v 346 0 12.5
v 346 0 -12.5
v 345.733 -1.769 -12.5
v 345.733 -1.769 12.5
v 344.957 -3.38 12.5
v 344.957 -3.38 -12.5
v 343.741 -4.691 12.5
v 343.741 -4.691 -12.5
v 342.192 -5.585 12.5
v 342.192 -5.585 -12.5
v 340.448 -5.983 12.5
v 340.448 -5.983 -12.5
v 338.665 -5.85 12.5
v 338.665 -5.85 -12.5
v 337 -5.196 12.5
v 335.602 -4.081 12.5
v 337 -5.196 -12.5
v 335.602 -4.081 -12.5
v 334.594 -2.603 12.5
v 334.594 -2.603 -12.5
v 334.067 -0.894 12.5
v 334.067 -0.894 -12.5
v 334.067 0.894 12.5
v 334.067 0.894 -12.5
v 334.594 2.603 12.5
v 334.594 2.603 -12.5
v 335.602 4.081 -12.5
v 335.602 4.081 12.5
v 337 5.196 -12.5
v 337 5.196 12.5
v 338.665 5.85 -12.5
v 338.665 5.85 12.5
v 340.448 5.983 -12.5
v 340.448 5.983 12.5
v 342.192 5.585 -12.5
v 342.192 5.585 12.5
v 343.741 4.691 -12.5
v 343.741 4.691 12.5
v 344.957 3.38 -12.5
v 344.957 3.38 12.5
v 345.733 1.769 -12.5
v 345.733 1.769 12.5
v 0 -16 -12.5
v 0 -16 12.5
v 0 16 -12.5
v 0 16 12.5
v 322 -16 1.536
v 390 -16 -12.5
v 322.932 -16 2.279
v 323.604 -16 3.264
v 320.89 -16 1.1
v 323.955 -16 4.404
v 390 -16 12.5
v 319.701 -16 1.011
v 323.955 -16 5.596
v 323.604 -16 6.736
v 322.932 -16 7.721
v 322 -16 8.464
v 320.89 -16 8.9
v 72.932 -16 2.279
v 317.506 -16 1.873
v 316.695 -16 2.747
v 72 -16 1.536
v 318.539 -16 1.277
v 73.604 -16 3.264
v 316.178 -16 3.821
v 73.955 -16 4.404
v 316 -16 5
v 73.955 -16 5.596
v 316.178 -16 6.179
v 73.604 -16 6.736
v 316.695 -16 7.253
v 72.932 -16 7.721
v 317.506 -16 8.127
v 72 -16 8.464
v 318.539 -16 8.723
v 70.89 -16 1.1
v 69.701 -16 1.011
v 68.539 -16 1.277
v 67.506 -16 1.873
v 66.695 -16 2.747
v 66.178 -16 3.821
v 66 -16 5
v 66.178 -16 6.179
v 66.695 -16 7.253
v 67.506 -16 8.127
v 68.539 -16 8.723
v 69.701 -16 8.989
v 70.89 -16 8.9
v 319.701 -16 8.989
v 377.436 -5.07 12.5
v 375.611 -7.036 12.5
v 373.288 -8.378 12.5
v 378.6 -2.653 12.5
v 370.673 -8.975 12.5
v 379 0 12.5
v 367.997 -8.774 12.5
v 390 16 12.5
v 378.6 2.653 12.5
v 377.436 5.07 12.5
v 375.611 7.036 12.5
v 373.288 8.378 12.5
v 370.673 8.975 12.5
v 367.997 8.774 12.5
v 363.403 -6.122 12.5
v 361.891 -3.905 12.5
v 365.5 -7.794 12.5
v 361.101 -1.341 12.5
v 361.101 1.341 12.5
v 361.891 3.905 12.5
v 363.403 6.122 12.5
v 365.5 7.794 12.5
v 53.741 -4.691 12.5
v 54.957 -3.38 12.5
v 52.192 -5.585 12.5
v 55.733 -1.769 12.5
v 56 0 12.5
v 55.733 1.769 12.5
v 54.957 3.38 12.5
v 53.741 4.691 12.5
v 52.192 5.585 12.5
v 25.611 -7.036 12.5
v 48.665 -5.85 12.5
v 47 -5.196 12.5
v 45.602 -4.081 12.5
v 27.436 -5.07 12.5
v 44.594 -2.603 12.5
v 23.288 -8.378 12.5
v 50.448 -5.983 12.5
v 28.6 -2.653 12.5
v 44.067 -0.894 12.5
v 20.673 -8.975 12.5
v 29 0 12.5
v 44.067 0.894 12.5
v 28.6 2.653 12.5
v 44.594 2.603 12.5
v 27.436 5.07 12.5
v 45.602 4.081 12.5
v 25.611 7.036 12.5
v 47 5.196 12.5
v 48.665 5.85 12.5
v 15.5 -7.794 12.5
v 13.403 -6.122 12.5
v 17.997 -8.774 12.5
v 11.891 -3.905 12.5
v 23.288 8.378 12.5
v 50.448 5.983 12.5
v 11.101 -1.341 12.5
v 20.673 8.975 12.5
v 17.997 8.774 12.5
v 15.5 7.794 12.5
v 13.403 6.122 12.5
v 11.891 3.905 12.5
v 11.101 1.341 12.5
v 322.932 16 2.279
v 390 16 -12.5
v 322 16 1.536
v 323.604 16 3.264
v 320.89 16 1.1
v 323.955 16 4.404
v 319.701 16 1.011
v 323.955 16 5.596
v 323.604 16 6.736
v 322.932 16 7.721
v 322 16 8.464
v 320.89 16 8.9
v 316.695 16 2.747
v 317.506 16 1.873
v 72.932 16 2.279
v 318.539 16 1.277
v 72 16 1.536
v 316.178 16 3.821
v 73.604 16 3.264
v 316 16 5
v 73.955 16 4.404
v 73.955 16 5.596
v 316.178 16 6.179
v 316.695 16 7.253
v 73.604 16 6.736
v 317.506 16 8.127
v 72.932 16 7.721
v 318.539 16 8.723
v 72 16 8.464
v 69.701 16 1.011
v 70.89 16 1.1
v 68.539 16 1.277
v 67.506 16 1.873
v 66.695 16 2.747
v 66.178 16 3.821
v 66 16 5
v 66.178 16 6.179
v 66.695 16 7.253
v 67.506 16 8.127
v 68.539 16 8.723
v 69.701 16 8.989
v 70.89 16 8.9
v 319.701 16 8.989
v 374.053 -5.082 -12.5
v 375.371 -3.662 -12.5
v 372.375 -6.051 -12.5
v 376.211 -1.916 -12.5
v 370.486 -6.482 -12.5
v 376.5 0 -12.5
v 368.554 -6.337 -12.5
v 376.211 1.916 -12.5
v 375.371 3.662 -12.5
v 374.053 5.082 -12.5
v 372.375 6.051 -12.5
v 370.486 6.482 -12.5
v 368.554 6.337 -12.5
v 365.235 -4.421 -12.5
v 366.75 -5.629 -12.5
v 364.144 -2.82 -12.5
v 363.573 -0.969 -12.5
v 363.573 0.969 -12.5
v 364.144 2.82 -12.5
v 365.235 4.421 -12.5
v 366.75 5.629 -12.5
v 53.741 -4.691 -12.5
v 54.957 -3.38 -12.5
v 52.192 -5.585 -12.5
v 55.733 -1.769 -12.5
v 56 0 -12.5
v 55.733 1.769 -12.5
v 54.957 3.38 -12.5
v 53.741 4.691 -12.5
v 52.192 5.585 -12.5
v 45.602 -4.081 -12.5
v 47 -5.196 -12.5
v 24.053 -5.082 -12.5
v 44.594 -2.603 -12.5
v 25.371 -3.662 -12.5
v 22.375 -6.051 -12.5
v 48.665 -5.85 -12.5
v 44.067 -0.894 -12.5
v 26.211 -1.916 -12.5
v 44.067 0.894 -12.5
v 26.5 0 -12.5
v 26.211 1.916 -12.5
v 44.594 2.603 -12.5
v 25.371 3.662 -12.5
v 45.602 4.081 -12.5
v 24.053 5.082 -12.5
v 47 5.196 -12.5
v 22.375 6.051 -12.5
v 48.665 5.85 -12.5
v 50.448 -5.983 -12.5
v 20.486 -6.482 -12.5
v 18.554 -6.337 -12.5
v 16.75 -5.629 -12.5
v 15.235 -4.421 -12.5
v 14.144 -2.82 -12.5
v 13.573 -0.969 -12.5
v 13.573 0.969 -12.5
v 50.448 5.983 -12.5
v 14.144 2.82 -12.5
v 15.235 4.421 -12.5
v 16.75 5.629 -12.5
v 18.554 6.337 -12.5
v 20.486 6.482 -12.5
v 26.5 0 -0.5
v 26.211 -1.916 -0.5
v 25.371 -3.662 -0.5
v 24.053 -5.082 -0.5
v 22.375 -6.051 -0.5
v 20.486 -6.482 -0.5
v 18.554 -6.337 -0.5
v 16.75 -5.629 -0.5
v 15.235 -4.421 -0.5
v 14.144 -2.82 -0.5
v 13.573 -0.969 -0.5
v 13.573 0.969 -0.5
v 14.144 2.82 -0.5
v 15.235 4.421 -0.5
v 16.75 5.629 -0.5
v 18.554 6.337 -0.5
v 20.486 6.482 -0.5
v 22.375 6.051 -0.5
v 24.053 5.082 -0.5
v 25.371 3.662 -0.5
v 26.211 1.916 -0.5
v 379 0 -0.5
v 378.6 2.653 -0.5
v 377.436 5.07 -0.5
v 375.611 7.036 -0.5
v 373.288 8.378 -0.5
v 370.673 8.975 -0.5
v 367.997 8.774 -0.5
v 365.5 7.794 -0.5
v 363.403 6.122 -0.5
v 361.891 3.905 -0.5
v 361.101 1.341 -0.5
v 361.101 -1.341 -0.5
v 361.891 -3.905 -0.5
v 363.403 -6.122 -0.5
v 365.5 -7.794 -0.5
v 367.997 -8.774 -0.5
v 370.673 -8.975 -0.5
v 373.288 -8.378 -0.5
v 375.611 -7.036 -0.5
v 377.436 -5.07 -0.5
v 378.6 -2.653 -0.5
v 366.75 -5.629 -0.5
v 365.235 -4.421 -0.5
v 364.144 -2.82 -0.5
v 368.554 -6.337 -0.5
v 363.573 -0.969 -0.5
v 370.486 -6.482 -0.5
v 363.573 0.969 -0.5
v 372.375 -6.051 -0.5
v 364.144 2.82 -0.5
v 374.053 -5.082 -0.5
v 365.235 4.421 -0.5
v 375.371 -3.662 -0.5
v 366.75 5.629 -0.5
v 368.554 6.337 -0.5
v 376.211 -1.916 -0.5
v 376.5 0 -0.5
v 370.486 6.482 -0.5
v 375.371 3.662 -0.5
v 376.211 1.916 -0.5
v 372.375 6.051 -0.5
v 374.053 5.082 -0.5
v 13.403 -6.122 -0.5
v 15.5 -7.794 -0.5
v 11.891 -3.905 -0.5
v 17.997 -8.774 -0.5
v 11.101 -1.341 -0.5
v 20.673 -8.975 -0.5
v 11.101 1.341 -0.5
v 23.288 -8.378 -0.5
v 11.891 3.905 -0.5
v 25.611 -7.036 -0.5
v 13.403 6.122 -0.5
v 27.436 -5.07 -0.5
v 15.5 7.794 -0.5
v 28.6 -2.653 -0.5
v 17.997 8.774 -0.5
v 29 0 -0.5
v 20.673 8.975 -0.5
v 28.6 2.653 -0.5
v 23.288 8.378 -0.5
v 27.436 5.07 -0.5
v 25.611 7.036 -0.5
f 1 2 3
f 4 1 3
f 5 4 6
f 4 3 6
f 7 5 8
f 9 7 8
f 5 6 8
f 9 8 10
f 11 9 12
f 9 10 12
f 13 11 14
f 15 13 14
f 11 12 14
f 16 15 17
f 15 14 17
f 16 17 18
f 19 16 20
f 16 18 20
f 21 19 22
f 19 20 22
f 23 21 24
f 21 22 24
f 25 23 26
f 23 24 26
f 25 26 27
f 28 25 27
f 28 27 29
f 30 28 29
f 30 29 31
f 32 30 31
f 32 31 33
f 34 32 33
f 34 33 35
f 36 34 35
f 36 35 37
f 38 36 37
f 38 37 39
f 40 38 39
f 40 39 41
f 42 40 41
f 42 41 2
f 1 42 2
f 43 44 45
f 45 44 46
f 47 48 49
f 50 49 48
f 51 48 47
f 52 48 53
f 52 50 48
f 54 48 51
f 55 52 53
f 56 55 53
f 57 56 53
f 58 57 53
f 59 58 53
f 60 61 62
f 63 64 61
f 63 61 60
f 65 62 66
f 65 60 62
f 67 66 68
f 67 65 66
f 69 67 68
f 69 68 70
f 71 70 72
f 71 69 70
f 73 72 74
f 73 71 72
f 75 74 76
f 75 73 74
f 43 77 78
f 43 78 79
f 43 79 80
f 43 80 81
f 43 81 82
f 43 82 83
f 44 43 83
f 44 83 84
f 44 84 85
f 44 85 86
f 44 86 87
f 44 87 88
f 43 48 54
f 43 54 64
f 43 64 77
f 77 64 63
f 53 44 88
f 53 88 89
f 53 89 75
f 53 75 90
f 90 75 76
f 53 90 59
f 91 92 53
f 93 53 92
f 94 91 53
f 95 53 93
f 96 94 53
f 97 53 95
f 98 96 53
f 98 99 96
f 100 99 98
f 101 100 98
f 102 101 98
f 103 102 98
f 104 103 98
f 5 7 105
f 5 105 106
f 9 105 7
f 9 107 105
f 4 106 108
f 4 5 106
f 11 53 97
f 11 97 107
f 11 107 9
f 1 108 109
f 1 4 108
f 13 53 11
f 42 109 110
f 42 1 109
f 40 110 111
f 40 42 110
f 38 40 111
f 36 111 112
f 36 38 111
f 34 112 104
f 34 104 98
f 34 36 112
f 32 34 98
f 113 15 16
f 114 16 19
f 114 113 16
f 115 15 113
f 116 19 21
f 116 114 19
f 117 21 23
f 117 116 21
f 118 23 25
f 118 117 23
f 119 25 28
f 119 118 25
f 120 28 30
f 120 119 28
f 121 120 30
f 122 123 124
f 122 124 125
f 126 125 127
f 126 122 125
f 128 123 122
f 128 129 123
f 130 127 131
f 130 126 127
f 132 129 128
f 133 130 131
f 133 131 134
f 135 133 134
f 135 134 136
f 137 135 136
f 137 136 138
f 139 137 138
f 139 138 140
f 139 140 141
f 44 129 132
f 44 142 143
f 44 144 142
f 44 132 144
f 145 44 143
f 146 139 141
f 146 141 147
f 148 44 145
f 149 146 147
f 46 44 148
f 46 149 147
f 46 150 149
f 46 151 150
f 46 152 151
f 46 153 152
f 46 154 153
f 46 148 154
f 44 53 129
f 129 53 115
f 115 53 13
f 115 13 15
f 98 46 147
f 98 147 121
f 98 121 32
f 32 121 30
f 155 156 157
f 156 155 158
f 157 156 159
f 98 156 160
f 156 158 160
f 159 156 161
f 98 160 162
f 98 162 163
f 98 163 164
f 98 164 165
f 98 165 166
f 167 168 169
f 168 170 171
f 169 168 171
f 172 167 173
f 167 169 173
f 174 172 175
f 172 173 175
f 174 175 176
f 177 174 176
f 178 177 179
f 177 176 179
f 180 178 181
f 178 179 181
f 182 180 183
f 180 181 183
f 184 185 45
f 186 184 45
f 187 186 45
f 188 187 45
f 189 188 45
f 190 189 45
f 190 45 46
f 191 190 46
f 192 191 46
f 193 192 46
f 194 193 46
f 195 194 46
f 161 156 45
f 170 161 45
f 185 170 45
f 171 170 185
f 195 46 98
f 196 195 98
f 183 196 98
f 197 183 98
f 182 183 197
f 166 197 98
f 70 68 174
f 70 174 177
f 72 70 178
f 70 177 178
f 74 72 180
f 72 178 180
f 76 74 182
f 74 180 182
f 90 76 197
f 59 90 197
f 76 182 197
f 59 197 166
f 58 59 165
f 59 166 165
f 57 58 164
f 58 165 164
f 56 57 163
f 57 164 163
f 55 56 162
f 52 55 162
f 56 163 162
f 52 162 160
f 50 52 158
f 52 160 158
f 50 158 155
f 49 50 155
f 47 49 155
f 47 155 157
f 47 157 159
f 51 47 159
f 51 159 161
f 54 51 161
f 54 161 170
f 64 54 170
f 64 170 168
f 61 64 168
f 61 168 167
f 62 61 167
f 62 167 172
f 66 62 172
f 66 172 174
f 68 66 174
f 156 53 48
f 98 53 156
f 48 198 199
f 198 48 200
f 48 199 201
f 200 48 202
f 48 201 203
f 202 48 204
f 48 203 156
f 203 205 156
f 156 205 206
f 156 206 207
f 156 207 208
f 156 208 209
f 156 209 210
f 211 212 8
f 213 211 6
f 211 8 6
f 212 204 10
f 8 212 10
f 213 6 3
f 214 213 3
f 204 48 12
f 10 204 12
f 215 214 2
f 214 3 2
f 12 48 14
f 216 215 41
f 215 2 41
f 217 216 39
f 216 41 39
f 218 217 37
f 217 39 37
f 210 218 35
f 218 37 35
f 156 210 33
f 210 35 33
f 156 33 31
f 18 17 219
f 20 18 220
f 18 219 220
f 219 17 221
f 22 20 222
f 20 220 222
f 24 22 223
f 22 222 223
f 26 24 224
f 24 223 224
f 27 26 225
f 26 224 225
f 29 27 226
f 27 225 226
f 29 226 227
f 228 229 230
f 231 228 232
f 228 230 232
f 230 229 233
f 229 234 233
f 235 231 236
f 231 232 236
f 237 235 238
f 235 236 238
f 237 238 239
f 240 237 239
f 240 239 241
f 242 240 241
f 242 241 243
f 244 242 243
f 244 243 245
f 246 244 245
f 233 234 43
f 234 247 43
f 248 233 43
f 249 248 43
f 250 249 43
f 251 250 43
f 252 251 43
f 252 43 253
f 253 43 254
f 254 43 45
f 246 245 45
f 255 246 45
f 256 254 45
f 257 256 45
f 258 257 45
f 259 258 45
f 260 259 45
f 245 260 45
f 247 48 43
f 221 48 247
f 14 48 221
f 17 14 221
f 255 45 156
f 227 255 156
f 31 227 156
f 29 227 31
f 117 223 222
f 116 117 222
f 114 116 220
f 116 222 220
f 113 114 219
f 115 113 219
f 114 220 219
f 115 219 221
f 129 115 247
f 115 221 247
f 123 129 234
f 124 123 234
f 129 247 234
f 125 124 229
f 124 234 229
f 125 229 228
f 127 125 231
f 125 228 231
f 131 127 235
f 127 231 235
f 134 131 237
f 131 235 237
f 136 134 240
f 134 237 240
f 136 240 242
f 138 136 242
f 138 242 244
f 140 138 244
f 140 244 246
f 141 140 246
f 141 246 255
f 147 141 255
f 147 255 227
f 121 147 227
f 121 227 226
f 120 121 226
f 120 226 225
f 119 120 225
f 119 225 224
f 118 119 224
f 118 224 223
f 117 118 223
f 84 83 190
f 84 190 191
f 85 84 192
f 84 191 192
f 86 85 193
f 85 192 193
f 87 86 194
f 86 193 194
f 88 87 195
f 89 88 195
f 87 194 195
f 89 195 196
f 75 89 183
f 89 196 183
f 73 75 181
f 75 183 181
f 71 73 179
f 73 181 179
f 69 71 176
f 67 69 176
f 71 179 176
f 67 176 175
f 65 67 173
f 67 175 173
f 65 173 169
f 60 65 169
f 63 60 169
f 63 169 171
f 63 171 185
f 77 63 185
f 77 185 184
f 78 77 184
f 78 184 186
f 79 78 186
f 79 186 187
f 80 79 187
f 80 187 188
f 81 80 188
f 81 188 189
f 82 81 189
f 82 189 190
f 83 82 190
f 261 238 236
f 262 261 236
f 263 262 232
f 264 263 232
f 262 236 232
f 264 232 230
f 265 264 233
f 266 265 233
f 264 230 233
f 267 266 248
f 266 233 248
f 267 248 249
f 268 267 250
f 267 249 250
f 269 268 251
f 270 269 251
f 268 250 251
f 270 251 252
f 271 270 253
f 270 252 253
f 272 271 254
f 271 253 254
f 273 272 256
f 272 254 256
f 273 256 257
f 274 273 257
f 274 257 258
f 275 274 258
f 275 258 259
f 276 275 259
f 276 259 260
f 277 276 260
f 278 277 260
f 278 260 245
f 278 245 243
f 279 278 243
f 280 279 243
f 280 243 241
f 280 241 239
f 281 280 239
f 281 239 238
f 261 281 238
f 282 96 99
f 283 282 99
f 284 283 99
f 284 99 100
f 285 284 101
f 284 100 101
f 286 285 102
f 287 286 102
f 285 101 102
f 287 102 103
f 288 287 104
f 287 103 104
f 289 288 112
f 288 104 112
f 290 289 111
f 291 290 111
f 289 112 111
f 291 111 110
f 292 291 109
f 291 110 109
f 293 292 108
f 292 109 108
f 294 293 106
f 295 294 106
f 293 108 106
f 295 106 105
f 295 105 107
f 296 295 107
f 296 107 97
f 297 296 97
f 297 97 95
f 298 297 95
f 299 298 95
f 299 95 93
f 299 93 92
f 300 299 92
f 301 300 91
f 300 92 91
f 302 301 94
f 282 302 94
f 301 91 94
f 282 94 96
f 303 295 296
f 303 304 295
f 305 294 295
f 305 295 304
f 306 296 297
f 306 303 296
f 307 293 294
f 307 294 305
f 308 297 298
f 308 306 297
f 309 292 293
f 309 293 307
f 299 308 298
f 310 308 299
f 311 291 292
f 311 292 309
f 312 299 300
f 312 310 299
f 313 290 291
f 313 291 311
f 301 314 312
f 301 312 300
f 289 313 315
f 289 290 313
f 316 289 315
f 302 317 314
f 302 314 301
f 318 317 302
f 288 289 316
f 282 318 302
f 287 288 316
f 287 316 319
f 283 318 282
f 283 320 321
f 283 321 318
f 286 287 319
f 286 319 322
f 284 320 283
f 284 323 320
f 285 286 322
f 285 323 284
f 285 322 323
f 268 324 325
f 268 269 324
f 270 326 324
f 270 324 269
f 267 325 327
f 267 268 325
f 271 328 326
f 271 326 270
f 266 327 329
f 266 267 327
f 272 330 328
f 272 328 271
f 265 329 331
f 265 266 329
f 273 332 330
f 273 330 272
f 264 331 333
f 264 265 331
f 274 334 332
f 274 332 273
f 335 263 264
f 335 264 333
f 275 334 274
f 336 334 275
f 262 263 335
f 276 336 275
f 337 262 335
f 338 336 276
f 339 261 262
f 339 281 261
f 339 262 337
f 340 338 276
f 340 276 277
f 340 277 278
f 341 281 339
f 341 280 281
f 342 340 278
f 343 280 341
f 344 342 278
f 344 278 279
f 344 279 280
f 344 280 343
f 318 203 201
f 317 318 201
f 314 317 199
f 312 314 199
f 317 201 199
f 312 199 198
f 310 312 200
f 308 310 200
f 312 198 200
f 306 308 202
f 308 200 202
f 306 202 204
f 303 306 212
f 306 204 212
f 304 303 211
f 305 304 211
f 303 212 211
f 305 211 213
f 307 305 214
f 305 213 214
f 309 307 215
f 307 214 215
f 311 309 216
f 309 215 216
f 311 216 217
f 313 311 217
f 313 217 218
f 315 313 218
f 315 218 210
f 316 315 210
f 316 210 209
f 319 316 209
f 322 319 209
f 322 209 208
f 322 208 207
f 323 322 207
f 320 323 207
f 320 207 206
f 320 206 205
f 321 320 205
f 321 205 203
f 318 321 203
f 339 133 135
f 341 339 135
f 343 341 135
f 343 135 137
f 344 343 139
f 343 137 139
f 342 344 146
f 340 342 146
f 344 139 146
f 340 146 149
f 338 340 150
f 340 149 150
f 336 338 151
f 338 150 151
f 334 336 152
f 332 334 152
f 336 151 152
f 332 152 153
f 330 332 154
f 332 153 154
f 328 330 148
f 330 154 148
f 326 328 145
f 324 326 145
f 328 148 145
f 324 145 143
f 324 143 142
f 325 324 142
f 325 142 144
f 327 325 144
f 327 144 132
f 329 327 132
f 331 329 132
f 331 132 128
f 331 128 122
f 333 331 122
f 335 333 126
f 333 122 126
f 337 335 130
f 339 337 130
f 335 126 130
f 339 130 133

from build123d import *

# Parameters (mm, degrees)
F0_W     = 32
F0_H     = 25
F1_DEPTH = 390
F2_R     = 4
F3_DEPTH = 93
F4_R     = 6.5
F5_DEPTH = 40.8
F6_R     = 9
F7_DEPTH = 13
F8_R     = 6
F9_DEPTH = 76.1


with BuildPart() as f1:
    # F0 (on Right) → F1 (new body)
    with BuildSketch(Plane.YZ):
        Rectangle(F0_W, F0_H)
    extrude(amount=F1_DEPTH)

    # F2 (on face) → F3 (cut)
    with BuildSketch(Plane(origin=(0, 16, 0), x_dir=(-1, 0, 0), z_dir=(0, 1, 0))):
        with Locations((-320, 5)):
            Circle(F2_R)
        with Locations((-70, 5)):
            Circle(F2_R)
    extrude(amount=-F3_DEPTH, mode=Mode.SUBTRACT)

    # F4 (on face) → F5 (cut)
    with BuildSketch(Plane(origin=(0, 0, -12.5), x_dir=(1, 0, 0), z_dir=(0, 0, -1))):
        with Locations((20, 0)):
            Circle(F4_R)
        with Locations((370, 0)):
            Circle(F4_R)
    extrude(amount=-F5_DEPTH, mode=Mode.SUBTRACT)

    # F6 (on face) → F7 (cut)
    with BuildSketch(Plane.XY.offset(12.5)):
        with Locations((20, 0)):
            Circle(F6_R)
        with Locations((370, 0)):
            Circle(F6_R)
    extrude(amount=-F7_DEPTH, mode=Mode.SUBTRACT)

    # F8 (on face) → F9 (cut)
    with BuildSketch(Plane(origin=(0, 0, -12.5), x_dir=(1, 0, 0), z_dir=(0, 0, -1))):
        with Locations((50, 0)):
            Circle(F8_R)
        with Locations((340, 0)):
            Circle(F8_R)
    extrude(amount=-F9_DEPTH, mode=Mode.SUBTRACT)


solid = f1.part
